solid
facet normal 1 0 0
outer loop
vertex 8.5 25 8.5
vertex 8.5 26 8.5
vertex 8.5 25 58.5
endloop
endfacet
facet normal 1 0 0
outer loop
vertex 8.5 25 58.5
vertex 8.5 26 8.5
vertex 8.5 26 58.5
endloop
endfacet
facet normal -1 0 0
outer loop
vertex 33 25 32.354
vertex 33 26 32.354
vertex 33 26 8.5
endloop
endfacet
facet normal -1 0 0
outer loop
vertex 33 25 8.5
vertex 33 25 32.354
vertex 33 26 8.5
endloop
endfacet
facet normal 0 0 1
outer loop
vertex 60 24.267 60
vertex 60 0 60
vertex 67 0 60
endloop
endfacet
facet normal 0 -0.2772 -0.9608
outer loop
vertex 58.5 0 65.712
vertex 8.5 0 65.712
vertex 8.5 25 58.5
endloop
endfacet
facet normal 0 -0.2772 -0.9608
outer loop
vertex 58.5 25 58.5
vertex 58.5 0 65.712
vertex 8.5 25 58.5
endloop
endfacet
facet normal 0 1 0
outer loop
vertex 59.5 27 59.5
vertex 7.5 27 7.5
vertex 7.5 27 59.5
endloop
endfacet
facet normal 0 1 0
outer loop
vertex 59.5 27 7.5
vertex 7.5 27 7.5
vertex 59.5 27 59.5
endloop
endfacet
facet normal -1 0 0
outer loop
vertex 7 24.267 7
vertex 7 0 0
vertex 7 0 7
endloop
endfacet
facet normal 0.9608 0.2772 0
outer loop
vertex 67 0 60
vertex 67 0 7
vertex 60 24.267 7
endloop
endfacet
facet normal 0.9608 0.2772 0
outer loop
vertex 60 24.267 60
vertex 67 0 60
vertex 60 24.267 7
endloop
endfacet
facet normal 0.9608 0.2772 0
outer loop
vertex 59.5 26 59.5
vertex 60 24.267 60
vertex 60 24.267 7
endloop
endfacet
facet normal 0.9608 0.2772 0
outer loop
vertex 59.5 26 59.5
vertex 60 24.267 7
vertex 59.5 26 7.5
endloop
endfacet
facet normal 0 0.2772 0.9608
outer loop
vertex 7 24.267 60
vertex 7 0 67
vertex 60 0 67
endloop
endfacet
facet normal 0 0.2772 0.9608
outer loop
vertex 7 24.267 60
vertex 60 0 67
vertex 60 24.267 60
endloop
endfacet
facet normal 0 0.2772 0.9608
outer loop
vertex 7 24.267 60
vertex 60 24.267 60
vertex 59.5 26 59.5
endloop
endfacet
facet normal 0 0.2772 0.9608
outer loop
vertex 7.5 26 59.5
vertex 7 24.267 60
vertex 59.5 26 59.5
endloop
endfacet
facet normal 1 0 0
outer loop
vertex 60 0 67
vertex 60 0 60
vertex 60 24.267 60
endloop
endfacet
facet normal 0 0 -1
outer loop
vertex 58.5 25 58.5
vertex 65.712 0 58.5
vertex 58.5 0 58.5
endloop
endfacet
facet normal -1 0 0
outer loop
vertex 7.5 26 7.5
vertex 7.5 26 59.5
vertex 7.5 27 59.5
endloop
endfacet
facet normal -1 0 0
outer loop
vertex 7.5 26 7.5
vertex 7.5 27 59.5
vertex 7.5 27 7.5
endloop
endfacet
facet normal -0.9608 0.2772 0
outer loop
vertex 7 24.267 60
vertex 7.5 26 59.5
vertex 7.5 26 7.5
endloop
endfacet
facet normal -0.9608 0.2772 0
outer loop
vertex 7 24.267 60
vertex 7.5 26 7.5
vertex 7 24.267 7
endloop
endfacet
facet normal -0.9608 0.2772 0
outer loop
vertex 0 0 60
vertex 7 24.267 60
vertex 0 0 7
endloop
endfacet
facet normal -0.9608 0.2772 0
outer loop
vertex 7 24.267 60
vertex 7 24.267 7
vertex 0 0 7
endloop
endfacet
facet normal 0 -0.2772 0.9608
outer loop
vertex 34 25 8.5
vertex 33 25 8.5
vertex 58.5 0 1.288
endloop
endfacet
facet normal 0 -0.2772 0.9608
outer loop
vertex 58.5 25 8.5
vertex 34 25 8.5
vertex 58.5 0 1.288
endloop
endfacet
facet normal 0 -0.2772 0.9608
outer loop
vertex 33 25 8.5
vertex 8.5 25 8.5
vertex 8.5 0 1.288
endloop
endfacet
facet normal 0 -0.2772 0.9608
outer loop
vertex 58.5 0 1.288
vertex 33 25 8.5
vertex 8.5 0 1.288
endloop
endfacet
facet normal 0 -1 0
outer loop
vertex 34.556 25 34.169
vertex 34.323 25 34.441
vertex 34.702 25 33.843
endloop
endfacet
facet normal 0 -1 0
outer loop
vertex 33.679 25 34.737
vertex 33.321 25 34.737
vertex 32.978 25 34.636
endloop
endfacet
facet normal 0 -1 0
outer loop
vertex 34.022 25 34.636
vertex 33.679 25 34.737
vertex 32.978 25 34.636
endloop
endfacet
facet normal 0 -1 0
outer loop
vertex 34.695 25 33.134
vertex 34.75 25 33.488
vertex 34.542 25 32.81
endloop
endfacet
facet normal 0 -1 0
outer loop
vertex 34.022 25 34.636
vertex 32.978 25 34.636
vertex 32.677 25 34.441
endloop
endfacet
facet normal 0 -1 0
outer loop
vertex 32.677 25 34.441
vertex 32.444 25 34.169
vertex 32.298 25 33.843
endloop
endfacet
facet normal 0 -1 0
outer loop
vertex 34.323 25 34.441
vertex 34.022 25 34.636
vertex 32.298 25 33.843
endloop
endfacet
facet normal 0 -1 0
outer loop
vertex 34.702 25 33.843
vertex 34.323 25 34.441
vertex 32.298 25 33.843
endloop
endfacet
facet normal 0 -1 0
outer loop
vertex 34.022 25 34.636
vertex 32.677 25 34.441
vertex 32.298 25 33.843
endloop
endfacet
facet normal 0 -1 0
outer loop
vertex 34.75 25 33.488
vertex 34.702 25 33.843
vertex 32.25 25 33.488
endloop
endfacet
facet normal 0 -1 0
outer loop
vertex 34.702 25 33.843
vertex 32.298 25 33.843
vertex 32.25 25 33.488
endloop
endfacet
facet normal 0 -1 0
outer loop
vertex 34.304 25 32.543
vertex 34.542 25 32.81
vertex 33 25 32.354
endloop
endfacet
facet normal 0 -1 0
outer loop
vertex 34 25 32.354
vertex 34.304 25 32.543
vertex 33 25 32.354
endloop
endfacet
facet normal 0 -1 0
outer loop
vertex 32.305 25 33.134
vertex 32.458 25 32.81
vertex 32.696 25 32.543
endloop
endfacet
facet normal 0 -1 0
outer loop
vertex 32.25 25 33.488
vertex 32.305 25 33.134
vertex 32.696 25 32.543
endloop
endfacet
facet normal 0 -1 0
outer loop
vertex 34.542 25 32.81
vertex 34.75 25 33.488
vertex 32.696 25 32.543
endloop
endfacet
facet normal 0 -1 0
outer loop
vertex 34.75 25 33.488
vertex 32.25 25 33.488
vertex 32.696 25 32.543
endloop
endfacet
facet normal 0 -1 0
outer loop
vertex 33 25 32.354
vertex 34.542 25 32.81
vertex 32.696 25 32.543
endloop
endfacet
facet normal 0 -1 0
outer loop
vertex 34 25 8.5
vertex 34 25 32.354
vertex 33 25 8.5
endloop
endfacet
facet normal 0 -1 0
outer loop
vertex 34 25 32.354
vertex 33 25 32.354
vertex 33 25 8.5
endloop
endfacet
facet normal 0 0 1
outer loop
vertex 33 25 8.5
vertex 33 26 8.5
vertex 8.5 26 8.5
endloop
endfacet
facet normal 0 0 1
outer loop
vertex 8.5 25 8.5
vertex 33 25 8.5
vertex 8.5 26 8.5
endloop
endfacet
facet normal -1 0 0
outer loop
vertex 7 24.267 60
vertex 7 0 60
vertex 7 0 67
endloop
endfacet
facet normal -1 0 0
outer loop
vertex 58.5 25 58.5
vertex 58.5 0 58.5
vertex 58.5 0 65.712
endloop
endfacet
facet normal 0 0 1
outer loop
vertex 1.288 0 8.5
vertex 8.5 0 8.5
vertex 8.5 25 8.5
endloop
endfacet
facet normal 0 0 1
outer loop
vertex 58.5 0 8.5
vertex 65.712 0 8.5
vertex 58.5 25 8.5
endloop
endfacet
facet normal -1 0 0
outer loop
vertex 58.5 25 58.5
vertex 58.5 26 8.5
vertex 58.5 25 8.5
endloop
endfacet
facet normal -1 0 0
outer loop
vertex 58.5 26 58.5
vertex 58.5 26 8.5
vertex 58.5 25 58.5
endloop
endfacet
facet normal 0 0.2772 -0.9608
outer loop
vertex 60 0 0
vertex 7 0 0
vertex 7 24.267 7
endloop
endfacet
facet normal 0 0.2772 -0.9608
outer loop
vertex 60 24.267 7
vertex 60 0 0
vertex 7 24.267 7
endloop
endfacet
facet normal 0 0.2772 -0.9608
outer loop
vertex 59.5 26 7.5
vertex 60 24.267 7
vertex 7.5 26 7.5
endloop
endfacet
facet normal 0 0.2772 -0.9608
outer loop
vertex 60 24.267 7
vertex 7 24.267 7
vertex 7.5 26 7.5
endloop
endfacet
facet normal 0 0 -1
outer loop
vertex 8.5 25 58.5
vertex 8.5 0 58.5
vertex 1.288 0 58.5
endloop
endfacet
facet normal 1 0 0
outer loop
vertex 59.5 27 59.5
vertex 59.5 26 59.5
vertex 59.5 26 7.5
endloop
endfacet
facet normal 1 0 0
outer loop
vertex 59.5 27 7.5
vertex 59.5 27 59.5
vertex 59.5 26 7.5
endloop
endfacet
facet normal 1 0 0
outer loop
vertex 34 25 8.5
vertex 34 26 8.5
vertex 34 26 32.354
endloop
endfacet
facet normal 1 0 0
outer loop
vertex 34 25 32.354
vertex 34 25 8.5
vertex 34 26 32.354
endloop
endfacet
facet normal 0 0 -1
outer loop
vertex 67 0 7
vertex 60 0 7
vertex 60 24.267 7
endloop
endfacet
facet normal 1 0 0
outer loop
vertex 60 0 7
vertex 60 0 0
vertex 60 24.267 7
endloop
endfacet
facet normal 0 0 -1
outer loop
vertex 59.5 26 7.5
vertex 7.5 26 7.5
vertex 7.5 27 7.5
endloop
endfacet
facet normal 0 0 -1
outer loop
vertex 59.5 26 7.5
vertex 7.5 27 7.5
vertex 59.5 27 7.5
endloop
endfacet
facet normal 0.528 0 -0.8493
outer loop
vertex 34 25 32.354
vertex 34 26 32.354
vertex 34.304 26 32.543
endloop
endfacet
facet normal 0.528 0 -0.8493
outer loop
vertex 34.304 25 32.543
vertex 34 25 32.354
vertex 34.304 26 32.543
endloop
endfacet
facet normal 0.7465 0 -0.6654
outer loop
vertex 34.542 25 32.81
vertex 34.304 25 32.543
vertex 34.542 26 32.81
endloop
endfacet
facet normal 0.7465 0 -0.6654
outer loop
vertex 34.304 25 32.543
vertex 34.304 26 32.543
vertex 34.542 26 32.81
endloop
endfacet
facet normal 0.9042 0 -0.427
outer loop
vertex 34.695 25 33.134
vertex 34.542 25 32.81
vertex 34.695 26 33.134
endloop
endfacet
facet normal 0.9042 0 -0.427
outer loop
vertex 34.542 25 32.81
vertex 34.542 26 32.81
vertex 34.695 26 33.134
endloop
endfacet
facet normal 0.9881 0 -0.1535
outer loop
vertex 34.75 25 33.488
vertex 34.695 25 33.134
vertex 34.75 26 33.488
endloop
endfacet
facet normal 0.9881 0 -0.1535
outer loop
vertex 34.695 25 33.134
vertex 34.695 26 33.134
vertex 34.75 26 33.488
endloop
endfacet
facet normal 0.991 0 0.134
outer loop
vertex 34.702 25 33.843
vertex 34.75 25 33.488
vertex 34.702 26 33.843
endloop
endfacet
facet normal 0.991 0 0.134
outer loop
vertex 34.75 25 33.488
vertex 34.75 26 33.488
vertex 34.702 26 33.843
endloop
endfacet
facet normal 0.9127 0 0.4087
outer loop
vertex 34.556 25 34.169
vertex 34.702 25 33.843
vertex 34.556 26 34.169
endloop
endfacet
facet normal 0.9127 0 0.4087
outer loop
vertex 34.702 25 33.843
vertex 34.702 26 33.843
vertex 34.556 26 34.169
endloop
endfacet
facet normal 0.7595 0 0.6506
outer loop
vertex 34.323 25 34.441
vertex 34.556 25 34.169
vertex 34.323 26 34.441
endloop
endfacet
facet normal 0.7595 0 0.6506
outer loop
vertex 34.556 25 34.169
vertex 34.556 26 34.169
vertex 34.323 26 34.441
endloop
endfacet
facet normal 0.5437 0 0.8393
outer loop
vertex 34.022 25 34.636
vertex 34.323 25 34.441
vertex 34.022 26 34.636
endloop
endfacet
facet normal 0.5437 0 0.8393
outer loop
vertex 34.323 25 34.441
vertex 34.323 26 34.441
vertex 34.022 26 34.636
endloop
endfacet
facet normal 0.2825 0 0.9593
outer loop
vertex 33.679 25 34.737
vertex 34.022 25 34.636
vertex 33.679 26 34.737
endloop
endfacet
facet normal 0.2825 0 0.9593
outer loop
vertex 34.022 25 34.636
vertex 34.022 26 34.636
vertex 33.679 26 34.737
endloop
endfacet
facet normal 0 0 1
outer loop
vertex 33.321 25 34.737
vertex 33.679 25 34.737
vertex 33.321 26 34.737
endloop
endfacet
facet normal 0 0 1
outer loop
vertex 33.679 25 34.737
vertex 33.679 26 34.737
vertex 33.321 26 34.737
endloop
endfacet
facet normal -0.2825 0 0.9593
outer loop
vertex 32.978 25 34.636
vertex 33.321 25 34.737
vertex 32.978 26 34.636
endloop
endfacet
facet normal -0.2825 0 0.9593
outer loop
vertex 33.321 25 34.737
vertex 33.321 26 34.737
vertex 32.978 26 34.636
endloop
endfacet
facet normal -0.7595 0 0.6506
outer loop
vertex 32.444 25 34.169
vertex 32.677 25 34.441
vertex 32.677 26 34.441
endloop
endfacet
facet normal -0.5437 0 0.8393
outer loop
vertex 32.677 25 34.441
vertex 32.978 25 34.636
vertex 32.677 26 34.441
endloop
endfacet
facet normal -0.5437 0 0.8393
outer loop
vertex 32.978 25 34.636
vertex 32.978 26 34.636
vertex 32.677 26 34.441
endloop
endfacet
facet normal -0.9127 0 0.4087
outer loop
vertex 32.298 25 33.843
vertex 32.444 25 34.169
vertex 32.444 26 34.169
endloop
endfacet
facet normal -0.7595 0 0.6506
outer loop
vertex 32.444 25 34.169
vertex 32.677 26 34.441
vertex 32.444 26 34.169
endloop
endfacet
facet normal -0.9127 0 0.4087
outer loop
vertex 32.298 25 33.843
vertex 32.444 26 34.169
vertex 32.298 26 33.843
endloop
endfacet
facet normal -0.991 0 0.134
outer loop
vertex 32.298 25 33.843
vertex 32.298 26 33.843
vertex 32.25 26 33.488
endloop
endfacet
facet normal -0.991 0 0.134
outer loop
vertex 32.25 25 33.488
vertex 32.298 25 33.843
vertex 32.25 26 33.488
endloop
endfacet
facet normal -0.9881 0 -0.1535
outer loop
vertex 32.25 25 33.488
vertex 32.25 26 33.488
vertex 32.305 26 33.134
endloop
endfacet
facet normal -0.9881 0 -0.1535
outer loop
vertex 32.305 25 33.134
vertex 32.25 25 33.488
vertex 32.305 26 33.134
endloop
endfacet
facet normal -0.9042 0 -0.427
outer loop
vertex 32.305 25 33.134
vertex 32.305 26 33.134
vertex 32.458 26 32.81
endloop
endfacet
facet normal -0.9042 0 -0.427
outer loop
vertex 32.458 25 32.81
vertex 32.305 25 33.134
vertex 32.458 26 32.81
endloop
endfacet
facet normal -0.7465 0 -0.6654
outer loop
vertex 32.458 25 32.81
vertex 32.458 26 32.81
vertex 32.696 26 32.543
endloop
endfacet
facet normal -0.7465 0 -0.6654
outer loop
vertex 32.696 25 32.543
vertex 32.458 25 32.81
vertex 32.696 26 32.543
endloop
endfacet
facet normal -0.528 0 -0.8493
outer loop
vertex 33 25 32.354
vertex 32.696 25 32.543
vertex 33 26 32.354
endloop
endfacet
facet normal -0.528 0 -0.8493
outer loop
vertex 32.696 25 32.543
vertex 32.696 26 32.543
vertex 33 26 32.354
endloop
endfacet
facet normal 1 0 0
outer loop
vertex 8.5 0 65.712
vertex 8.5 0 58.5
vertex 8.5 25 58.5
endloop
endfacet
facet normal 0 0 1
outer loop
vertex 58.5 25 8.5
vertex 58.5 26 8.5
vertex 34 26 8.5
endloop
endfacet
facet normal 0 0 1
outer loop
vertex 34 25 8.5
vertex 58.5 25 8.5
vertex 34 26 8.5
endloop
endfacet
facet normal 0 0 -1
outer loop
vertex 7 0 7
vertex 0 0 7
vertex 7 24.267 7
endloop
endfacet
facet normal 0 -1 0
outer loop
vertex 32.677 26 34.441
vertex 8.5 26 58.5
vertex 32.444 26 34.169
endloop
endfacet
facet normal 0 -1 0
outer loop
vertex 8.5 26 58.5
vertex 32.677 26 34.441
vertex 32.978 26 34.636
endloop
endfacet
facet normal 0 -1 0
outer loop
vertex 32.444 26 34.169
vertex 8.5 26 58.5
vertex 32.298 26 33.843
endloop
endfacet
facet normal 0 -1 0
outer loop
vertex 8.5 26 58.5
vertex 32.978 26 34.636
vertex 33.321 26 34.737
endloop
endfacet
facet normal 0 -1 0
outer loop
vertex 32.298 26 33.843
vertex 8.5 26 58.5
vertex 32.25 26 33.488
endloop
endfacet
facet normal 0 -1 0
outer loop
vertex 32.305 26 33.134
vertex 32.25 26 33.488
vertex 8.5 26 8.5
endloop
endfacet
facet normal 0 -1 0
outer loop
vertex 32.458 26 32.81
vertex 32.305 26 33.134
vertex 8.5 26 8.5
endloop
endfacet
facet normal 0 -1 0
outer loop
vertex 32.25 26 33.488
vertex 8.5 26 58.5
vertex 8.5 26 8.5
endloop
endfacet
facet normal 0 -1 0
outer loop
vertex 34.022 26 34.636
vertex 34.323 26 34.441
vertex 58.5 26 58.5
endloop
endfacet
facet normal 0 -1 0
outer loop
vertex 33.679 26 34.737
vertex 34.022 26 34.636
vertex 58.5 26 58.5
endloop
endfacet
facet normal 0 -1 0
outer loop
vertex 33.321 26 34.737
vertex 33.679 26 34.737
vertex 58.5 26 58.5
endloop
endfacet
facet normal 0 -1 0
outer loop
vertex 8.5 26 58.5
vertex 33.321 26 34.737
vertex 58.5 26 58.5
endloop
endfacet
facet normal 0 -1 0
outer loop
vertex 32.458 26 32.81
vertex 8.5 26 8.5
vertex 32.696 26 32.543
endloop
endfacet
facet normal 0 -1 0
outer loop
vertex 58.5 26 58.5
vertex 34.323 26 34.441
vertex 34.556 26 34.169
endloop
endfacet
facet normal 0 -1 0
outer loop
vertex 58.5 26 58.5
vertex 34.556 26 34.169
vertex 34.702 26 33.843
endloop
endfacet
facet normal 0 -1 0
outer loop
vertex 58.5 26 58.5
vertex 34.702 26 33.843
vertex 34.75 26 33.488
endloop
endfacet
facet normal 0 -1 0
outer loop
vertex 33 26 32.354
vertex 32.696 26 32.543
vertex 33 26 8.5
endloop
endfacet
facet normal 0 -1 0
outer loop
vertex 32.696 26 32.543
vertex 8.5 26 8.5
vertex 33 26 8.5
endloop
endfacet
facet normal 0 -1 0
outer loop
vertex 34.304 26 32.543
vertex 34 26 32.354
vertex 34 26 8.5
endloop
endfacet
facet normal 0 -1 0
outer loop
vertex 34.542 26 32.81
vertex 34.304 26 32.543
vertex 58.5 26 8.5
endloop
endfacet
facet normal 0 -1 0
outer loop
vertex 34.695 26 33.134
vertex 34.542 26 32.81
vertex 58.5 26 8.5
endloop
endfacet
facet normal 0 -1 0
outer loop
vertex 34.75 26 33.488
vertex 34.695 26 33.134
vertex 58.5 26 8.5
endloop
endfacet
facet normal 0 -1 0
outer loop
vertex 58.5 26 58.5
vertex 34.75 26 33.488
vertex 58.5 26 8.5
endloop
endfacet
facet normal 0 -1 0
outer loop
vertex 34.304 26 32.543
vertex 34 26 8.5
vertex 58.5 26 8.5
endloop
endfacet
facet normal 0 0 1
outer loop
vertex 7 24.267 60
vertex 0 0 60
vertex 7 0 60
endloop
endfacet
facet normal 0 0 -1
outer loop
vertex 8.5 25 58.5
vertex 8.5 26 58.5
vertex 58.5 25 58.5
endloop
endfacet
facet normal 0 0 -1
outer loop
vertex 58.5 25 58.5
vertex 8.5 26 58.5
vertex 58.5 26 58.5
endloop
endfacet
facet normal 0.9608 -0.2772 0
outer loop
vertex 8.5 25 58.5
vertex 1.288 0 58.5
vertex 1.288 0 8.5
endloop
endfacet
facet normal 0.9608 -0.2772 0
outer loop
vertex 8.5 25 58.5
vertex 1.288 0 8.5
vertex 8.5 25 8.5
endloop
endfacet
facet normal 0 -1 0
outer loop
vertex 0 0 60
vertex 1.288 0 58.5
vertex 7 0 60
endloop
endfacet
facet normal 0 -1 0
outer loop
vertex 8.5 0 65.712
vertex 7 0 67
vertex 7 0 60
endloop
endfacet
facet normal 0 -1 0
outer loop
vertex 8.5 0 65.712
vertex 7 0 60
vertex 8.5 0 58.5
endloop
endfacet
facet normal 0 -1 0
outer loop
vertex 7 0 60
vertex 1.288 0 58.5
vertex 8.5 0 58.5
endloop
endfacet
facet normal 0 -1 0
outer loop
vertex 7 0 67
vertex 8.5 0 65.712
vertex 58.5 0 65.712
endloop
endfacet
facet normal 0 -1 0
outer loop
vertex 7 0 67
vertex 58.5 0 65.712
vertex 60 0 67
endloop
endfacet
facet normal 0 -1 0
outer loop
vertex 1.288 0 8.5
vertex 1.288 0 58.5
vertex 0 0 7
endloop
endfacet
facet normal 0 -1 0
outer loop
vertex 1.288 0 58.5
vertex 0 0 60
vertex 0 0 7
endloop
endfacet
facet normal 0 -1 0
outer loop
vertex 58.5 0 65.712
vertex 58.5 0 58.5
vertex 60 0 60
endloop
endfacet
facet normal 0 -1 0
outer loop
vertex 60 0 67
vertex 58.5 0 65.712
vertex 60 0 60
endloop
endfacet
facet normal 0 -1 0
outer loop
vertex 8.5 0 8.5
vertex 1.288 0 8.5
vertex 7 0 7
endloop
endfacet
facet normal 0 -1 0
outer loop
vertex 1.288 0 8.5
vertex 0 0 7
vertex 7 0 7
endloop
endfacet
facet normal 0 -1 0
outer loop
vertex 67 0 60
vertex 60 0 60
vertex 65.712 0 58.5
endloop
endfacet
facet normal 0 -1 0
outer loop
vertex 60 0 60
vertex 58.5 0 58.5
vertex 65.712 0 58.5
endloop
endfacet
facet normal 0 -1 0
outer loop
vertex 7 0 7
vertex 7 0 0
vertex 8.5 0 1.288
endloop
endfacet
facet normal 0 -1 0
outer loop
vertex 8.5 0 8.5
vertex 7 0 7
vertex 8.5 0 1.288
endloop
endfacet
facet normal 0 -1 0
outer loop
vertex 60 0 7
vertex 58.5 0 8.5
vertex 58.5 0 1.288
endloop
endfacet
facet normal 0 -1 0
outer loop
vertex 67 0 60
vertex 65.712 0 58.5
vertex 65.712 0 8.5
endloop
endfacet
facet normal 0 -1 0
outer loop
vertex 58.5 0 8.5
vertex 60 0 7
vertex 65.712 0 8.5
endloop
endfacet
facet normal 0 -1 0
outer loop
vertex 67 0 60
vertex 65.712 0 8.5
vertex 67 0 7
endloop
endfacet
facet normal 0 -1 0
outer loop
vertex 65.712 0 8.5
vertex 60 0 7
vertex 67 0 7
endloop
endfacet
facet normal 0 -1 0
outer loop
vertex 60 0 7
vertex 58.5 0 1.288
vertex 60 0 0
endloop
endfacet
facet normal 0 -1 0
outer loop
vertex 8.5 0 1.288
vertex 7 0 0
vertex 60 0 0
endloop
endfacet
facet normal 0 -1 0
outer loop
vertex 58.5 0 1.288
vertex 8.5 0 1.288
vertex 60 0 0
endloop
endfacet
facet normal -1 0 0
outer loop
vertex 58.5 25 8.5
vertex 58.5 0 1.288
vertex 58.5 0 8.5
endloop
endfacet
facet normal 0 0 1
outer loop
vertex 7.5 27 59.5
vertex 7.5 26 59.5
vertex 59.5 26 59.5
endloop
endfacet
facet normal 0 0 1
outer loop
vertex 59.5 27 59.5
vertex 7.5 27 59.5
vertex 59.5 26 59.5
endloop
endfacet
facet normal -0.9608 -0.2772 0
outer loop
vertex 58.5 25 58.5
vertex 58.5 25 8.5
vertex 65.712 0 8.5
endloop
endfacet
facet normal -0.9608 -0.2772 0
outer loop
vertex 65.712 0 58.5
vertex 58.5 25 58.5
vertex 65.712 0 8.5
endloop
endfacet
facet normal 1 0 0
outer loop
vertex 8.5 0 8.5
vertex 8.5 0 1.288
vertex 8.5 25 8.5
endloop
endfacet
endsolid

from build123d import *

# Parameters (mm, degrees)
SALIENTE_EXTRUIR1_DEPTH    = 67
CORTAR_EXTRUIR1_DEPTH      = 107
CORTAR_EXTRUIR2_DEPTH      = 107
CORTAR_EXTRUIR3_DEPTH      = 25
CORTAR_EXTRUIR3_DEPTH_BACK = 25
CORTAR_EXTRUIR4_DEPTH      = 25
CORTAR_EXTRUIR4_DEPTH_BACK = 25
CROQUIS14_W                = 7
CROQUIS14_H                = 7
CORTAR_EXTRUIR6_DEPTH      = 70
CROQUIS15_W                = 52
CROQUIS15_H                = 52
SALIENTE_EXTRUIR10_DEPTH   = 1


with BuildPart() as part:
    # Croquis1 → Saliente-Extruir1 (new body)
    with BuildSketch(Plane.XY):
        Polygon((0, 0), (67, 0), (59.5, 26), (7.5, 26), align=None)
    extrude(amount=SALIENTE_EXTRUIR1_DEPTH)

    # Croquis3 → Cortar-Extruir1 (cut)
    with BuildSketch(Plane(origin=(0, 0, 0), x_dir=(0, 0, -1), z_dir=(1, 0, 0))):
        Polygon((-67, 0), (-59.5, 26), (-67, 26), align=None)
        Polygon((0, 0), (-7.5, 26), (0, 26), align=None)
    extrude(amount=CORTAR_EXTRUIR1_DEPTH, mode=Mode.SUBTRACT)

    # Croquis5 → Cortar-Extruir2 (cut)
    with BuildSketch(Plane(origin=(0, 26, 0), x_dir=(1, 0, 0), z_dir=(0, 1, 0))):
        with BuildLine():
            Line((33, -32.354356076), (33, -8.5))
            Line((33, -8.5), (8.5, -8.5))
            Line((8.5, -8.5), (8.5, -58.5))
            Line((8.5, -58.5), (58.5, -58.5))
            Line((58.5, -58.5), (58.5, -8.5))
            Line((58.5, -8.5), (34, -8.5))
            Line((34, -8.5), (34, -32.354356076))
            ThreePointArc((34, -32.354356076), (33.5, -34.75), (33, -32.354356076))
        make_face()
    extrude(amount=-CORTAR_EXTRUIR2_DEPTH, mode=Mode.SUBTRACT)

    # Croquis6 → Cortar-Extruir3 (cut, two sides: drawn at the far end of the back side and taken through both)
    with BuildSketch(Plane(origin=(33.5, 0, 0), x_dir=(0, 0, -1), z_dir=(1, 0, 0)).offset(-CORTAR_EXTRUIR3_DEPTH_BACK)):
        Polygon((-65.711538462, 0), (-58.5, 25), (-8.5, 25), (-1.288461538, 0), align=None)
    extrude(amount=CORTAR_EXTRUIR3_DEPTH + CORTAR_EXTRUIR3_DEPTH_BACK, mode=Mode.SUBTRACT)

    # Croquis7 → Cortar-Extruir4 (cut, two sides: drawn at the far end of the back side and taken through both)
    with BuildSketch(Plane.XY.offset(33.5).offset(-CORTAR_EXTRUIR4_DEPTH_BACK)):
        Polygon((1.288461538, 0), (8.5, 25), (58.5, 25), (65.711538462, 0), align=None)
    extrude(amount=CORTAR_EXTRUIR4_DEPTH + CORTAR_EXTRUIR4_DEPTH_BACK, mode=Mode.SUBTRACT)

    # Croquis14 → Cortar-Extruir6 (cut)
    with BuildSketch(Plane.XZ):
        with Locations((63.5, 3.5)):
            Rectangle(CROQUIS14_W, CROQUIS14_H)
        with Locations((63.5, 63.5)):
            Rectangle(CROQUIS14_W, CROQUIS14_H)
        with Locations((3.5, 3.5)):
            Rectangle(CROQUIS14_W, CROQUIS14_H)
        with Locations((3.5, 63.5)):
            Rectangle(CROQUIS14_W, CROQUIS14_H)
    extrude(amount=-CORTAR_EXTRUIR6_DEPTH, mode=Mode.SUBTRACT)

    # Croquis15 → Saliente-Extruir10 (add)
    with BuildSketch(Plane(origin=(0, 26, 0), x_dir=(1, 0, 0), z_dir=(0, 1, 0))):
        with Locations((33.5, -33.5)):
            Rectangle(CROQUIS15_W, CROQUIS15_H)
    extrude(amount=SALIENTE_EXTRUIR10_DEPTH)


solid = part.part
